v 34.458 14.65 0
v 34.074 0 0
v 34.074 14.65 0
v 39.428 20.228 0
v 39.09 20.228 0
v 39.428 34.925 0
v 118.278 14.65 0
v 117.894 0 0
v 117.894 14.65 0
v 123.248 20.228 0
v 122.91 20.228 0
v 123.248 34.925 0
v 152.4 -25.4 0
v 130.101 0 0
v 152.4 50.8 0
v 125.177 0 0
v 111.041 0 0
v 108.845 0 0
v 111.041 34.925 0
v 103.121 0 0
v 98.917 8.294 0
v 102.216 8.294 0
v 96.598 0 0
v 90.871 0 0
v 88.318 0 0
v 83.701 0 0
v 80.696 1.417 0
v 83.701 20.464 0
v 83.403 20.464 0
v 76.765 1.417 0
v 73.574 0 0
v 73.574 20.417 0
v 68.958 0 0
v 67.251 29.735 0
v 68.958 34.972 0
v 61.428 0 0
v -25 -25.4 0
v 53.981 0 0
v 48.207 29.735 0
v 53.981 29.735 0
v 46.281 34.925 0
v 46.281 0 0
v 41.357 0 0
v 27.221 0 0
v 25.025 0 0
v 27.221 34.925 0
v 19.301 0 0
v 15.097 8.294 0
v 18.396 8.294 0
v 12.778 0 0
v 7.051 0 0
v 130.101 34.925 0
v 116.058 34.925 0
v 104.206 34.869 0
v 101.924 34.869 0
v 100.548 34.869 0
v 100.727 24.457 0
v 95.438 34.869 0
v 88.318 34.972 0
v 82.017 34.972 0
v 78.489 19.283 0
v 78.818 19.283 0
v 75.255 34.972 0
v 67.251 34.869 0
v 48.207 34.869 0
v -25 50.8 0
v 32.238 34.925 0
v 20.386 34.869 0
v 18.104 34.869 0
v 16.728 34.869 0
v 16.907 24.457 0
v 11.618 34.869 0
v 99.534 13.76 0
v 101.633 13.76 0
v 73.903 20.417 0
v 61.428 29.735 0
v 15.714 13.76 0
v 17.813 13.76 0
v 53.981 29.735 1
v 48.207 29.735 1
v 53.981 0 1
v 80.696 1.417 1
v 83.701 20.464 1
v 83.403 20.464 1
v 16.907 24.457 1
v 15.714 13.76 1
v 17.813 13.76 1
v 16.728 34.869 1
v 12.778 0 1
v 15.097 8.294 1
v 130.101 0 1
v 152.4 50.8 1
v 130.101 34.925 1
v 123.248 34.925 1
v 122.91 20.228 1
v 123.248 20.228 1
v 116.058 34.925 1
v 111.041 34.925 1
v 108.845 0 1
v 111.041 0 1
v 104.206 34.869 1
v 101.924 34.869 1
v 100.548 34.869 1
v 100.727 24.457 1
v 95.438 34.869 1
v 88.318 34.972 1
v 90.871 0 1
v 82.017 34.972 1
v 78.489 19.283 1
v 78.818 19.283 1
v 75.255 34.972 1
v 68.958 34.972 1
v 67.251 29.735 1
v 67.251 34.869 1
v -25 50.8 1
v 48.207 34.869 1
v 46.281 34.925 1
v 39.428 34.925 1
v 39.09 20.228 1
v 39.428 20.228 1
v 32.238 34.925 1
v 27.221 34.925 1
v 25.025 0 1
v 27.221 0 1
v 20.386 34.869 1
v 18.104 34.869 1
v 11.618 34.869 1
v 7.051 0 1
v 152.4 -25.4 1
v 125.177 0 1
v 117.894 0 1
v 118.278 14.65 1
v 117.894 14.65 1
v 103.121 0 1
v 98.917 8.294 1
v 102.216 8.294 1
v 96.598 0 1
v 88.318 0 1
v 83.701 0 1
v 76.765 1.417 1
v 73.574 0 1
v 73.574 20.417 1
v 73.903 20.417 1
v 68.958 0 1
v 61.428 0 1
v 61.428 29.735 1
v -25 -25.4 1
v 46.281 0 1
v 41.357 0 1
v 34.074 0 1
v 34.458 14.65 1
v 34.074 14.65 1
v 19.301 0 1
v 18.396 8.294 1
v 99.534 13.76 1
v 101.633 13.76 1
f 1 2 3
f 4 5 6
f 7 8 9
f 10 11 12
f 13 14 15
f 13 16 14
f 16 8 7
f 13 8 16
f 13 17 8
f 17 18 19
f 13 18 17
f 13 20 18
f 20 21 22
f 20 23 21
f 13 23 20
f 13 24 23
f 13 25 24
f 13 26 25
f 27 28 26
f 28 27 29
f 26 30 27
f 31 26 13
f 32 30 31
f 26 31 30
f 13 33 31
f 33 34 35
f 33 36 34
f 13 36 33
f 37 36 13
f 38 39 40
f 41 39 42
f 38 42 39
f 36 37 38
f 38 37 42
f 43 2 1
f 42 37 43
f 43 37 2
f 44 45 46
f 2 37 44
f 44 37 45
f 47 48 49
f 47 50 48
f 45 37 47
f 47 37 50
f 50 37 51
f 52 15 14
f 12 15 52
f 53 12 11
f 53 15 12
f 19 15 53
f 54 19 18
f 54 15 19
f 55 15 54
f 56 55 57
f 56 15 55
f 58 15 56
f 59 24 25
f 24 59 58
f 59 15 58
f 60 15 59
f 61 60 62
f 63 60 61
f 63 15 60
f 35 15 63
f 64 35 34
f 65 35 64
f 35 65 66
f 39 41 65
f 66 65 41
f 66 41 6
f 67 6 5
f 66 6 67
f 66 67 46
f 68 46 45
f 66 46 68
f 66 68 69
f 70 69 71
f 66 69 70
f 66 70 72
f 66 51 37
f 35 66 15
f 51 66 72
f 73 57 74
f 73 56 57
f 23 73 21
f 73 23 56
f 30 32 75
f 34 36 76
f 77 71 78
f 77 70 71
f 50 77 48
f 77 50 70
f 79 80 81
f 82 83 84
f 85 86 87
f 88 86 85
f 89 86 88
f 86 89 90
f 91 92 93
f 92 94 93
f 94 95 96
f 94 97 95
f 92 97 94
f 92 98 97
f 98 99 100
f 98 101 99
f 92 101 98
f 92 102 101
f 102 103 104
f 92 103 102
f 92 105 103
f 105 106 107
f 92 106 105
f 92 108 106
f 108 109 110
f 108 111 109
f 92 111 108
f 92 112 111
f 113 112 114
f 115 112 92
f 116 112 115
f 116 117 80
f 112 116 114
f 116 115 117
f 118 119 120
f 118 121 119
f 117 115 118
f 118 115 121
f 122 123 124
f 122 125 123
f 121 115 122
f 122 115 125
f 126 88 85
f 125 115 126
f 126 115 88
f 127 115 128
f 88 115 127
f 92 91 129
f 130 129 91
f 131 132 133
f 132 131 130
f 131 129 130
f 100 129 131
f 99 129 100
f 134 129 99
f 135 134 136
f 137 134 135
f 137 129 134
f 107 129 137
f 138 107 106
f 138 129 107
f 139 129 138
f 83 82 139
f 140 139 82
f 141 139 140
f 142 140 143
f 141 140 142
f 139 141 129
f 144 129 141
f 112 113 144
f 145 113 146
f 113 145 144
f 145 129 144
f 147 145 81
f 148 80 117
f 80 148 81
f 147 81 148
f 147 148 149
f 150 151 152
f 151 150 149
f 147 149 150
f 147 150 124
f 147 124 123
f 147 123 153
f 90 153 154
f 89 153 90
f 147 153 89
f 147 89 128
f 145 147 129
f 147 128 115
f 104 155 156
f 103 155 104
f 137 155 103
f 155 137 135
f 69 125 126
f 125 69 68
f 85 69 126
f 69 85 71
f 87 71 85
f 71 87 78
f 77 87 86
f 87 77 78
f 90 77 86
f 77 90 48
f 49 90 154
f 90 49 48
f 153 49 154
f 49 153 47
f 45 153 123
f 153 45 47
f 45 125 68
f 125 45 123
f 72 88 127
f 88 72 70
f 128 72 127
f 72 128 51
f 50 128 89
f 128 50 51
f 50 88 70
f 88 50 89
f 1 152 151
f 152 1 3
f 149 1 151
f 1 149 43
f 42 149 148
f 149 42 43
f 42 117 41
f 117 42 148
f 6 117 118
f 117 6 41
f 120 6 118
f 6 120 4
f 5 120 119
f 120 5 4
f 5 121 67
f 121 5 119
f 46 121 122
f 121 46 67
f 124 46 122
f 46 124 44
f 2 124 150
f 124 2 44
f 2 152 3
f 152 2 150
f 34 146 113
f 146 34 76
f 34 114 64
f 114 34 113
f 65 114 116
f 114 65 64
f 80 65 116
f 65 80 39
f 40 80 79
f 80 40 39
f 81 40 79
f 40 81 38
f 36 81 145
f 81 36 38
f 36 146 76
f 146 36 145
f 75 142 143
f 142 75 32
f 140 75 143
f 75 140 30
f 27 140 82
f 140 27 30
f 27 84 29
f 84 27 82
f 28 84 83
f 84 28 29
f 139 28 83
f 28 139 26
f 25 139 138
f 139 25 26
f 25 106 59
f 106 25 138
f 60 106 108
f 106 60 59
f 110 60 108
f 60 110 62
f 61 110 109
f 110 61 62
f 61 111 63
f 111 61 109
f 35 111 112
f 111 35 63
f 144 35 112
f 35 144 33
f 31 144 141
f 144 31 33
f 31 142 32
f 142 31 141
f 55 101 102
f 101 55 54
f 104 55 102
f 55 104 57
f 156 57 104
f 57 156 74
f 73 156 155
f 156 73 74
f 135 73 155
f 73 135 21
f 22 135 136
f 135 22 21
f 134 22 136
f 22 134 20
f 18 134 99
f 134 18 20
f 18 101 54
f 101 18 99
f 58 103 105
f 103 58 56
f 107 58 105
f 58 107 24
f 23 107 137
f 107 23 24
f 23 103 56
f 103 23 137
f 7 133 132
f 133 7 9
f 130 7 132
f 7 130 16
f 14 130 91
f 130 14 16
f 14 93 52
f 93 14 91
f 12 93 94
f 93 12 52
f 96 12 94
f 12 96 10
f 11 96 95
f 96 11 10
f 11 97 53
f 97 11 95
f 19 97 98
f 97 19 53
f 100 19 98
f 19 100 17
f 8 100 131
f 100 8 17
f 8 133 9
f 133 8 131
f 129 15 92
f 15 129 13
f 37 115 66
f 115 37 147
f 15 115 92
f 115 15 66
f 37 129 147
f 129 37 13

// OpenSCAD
use <Write.scad>;

// BEGIN configuration
stencil_thickness_mm = 1;
letter_height_inches = 1;
word = "ANTMAN";
// END configuration

mm = letter_height_inches * 25.4;
space = 1.2;

difference() {
  translate([-25,-1 * mm,0]) {
    cube([(mm * len(word)) + 25, mm * 3, stencil_thickness_mm]);
  }
  write(word, h=mm, t=stencil_thickness_mm, font="stencil_TNH.dxf", space=space);
}
